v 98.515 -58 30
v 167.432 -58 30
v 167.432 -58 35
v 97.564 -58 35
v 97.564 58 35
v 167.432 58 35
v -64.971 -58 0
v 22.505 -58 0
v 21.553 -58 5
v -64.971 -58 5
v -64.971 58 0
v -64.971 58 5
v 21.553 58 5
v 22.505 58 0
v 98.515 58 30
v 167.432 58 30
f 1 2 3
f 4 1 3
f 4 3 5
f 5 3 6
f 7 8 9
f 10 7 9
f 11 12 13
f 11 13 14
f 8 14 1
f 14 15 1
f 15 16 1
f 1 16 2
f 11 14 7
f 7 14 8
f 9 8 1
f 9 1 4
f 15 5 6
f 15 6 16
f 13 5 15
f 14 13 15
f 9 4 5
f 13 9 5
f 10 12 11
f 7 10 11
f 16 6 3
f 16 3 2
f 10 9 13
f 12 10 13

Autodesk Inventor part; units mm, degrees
ref_plane "YZ Plane" through (0, 0, 0) normal (1, 0, 0) x (0, 1, 0)
ref_plane "XZ Plane" through (0, 0, 0) normal (0, 1, 0) x (-1, 0, 0)
ref_plane "XY Plane" through (0, 0, 0) normal (0, 0, 1) x (1, 0, 0)
ref_plane "Work Plane1" through (0, 0, 0) normal (0, 0, 1) x (1, 0, 0)
ref_plane "Work Plane2" through (-64.971, 55, -60) normal (-1, 0, 0) x (0, 0, 1)
sketch "Sketch2" plane through (-64.971, 55, -60) normal (-1, 0, 0) x (0, 0, 1)
  ellipse E0 centre (4.45, -98.8108) end of major axis (-15.5398, -98.8108) minor radius 0.0934 projected
  line L0 (5, -113) -> (60, -113) projected
  line L1 (60, 3) -> (12.1238, 3) projected
  line L2 (60, 3) -> (65, 3)
  line L3 (65, 3) -> (65, -113)
  line L4 (65, -113) -> (60, -113)
  line L5 (60, -113) -> (60, 3)
  point P0 (60, -55)
  dimension "d2" = 5
ref_plane "Work Plane3" through (-61.971, -58, -60) normal (0, -1, 0) x (1, 0, 0)
sketch "Sketch3" plane through (-61.971, -58, -60) normal (0, -1, 0) x (1, 0, 0)
  line L0 (-3, 65) -> (-3, 60) projected
  line L1 (5, 60) -> (84, 60) projected
  line L2 (160.0104, 90) -> (84, 60) projected
  line L3 (160.0104, 90) -> (221.6846, 90) projected
  line L4 (-3, 62.5) -> (84, 62.5)
  line L5 (84, 62.5) -> (160.0104, 92.5)
  spline S0 degree 3 poles (221.6846, 90) (223.5782, 90.3311) (225.4462, 90.6526) (226.8152, 90.8725) (228.4747, 91.1391) (229.032, 91.2163) (229.4035, 91.2679) knots 0 0 0 0 0.710077 0.710077 0.710077 1.570796 1.570796 1.570796 1.570796 projected
  line L6 (160.0104, 92.5) -> (229.4035, 92.5)
  point P0 (61.971, 60)
sweep "Sweep1" add profiles "Sketch2" path "Sketch3" path curves L4 L5 L6 contours L2 L3 L4 L5
properties part number "Lock1"
